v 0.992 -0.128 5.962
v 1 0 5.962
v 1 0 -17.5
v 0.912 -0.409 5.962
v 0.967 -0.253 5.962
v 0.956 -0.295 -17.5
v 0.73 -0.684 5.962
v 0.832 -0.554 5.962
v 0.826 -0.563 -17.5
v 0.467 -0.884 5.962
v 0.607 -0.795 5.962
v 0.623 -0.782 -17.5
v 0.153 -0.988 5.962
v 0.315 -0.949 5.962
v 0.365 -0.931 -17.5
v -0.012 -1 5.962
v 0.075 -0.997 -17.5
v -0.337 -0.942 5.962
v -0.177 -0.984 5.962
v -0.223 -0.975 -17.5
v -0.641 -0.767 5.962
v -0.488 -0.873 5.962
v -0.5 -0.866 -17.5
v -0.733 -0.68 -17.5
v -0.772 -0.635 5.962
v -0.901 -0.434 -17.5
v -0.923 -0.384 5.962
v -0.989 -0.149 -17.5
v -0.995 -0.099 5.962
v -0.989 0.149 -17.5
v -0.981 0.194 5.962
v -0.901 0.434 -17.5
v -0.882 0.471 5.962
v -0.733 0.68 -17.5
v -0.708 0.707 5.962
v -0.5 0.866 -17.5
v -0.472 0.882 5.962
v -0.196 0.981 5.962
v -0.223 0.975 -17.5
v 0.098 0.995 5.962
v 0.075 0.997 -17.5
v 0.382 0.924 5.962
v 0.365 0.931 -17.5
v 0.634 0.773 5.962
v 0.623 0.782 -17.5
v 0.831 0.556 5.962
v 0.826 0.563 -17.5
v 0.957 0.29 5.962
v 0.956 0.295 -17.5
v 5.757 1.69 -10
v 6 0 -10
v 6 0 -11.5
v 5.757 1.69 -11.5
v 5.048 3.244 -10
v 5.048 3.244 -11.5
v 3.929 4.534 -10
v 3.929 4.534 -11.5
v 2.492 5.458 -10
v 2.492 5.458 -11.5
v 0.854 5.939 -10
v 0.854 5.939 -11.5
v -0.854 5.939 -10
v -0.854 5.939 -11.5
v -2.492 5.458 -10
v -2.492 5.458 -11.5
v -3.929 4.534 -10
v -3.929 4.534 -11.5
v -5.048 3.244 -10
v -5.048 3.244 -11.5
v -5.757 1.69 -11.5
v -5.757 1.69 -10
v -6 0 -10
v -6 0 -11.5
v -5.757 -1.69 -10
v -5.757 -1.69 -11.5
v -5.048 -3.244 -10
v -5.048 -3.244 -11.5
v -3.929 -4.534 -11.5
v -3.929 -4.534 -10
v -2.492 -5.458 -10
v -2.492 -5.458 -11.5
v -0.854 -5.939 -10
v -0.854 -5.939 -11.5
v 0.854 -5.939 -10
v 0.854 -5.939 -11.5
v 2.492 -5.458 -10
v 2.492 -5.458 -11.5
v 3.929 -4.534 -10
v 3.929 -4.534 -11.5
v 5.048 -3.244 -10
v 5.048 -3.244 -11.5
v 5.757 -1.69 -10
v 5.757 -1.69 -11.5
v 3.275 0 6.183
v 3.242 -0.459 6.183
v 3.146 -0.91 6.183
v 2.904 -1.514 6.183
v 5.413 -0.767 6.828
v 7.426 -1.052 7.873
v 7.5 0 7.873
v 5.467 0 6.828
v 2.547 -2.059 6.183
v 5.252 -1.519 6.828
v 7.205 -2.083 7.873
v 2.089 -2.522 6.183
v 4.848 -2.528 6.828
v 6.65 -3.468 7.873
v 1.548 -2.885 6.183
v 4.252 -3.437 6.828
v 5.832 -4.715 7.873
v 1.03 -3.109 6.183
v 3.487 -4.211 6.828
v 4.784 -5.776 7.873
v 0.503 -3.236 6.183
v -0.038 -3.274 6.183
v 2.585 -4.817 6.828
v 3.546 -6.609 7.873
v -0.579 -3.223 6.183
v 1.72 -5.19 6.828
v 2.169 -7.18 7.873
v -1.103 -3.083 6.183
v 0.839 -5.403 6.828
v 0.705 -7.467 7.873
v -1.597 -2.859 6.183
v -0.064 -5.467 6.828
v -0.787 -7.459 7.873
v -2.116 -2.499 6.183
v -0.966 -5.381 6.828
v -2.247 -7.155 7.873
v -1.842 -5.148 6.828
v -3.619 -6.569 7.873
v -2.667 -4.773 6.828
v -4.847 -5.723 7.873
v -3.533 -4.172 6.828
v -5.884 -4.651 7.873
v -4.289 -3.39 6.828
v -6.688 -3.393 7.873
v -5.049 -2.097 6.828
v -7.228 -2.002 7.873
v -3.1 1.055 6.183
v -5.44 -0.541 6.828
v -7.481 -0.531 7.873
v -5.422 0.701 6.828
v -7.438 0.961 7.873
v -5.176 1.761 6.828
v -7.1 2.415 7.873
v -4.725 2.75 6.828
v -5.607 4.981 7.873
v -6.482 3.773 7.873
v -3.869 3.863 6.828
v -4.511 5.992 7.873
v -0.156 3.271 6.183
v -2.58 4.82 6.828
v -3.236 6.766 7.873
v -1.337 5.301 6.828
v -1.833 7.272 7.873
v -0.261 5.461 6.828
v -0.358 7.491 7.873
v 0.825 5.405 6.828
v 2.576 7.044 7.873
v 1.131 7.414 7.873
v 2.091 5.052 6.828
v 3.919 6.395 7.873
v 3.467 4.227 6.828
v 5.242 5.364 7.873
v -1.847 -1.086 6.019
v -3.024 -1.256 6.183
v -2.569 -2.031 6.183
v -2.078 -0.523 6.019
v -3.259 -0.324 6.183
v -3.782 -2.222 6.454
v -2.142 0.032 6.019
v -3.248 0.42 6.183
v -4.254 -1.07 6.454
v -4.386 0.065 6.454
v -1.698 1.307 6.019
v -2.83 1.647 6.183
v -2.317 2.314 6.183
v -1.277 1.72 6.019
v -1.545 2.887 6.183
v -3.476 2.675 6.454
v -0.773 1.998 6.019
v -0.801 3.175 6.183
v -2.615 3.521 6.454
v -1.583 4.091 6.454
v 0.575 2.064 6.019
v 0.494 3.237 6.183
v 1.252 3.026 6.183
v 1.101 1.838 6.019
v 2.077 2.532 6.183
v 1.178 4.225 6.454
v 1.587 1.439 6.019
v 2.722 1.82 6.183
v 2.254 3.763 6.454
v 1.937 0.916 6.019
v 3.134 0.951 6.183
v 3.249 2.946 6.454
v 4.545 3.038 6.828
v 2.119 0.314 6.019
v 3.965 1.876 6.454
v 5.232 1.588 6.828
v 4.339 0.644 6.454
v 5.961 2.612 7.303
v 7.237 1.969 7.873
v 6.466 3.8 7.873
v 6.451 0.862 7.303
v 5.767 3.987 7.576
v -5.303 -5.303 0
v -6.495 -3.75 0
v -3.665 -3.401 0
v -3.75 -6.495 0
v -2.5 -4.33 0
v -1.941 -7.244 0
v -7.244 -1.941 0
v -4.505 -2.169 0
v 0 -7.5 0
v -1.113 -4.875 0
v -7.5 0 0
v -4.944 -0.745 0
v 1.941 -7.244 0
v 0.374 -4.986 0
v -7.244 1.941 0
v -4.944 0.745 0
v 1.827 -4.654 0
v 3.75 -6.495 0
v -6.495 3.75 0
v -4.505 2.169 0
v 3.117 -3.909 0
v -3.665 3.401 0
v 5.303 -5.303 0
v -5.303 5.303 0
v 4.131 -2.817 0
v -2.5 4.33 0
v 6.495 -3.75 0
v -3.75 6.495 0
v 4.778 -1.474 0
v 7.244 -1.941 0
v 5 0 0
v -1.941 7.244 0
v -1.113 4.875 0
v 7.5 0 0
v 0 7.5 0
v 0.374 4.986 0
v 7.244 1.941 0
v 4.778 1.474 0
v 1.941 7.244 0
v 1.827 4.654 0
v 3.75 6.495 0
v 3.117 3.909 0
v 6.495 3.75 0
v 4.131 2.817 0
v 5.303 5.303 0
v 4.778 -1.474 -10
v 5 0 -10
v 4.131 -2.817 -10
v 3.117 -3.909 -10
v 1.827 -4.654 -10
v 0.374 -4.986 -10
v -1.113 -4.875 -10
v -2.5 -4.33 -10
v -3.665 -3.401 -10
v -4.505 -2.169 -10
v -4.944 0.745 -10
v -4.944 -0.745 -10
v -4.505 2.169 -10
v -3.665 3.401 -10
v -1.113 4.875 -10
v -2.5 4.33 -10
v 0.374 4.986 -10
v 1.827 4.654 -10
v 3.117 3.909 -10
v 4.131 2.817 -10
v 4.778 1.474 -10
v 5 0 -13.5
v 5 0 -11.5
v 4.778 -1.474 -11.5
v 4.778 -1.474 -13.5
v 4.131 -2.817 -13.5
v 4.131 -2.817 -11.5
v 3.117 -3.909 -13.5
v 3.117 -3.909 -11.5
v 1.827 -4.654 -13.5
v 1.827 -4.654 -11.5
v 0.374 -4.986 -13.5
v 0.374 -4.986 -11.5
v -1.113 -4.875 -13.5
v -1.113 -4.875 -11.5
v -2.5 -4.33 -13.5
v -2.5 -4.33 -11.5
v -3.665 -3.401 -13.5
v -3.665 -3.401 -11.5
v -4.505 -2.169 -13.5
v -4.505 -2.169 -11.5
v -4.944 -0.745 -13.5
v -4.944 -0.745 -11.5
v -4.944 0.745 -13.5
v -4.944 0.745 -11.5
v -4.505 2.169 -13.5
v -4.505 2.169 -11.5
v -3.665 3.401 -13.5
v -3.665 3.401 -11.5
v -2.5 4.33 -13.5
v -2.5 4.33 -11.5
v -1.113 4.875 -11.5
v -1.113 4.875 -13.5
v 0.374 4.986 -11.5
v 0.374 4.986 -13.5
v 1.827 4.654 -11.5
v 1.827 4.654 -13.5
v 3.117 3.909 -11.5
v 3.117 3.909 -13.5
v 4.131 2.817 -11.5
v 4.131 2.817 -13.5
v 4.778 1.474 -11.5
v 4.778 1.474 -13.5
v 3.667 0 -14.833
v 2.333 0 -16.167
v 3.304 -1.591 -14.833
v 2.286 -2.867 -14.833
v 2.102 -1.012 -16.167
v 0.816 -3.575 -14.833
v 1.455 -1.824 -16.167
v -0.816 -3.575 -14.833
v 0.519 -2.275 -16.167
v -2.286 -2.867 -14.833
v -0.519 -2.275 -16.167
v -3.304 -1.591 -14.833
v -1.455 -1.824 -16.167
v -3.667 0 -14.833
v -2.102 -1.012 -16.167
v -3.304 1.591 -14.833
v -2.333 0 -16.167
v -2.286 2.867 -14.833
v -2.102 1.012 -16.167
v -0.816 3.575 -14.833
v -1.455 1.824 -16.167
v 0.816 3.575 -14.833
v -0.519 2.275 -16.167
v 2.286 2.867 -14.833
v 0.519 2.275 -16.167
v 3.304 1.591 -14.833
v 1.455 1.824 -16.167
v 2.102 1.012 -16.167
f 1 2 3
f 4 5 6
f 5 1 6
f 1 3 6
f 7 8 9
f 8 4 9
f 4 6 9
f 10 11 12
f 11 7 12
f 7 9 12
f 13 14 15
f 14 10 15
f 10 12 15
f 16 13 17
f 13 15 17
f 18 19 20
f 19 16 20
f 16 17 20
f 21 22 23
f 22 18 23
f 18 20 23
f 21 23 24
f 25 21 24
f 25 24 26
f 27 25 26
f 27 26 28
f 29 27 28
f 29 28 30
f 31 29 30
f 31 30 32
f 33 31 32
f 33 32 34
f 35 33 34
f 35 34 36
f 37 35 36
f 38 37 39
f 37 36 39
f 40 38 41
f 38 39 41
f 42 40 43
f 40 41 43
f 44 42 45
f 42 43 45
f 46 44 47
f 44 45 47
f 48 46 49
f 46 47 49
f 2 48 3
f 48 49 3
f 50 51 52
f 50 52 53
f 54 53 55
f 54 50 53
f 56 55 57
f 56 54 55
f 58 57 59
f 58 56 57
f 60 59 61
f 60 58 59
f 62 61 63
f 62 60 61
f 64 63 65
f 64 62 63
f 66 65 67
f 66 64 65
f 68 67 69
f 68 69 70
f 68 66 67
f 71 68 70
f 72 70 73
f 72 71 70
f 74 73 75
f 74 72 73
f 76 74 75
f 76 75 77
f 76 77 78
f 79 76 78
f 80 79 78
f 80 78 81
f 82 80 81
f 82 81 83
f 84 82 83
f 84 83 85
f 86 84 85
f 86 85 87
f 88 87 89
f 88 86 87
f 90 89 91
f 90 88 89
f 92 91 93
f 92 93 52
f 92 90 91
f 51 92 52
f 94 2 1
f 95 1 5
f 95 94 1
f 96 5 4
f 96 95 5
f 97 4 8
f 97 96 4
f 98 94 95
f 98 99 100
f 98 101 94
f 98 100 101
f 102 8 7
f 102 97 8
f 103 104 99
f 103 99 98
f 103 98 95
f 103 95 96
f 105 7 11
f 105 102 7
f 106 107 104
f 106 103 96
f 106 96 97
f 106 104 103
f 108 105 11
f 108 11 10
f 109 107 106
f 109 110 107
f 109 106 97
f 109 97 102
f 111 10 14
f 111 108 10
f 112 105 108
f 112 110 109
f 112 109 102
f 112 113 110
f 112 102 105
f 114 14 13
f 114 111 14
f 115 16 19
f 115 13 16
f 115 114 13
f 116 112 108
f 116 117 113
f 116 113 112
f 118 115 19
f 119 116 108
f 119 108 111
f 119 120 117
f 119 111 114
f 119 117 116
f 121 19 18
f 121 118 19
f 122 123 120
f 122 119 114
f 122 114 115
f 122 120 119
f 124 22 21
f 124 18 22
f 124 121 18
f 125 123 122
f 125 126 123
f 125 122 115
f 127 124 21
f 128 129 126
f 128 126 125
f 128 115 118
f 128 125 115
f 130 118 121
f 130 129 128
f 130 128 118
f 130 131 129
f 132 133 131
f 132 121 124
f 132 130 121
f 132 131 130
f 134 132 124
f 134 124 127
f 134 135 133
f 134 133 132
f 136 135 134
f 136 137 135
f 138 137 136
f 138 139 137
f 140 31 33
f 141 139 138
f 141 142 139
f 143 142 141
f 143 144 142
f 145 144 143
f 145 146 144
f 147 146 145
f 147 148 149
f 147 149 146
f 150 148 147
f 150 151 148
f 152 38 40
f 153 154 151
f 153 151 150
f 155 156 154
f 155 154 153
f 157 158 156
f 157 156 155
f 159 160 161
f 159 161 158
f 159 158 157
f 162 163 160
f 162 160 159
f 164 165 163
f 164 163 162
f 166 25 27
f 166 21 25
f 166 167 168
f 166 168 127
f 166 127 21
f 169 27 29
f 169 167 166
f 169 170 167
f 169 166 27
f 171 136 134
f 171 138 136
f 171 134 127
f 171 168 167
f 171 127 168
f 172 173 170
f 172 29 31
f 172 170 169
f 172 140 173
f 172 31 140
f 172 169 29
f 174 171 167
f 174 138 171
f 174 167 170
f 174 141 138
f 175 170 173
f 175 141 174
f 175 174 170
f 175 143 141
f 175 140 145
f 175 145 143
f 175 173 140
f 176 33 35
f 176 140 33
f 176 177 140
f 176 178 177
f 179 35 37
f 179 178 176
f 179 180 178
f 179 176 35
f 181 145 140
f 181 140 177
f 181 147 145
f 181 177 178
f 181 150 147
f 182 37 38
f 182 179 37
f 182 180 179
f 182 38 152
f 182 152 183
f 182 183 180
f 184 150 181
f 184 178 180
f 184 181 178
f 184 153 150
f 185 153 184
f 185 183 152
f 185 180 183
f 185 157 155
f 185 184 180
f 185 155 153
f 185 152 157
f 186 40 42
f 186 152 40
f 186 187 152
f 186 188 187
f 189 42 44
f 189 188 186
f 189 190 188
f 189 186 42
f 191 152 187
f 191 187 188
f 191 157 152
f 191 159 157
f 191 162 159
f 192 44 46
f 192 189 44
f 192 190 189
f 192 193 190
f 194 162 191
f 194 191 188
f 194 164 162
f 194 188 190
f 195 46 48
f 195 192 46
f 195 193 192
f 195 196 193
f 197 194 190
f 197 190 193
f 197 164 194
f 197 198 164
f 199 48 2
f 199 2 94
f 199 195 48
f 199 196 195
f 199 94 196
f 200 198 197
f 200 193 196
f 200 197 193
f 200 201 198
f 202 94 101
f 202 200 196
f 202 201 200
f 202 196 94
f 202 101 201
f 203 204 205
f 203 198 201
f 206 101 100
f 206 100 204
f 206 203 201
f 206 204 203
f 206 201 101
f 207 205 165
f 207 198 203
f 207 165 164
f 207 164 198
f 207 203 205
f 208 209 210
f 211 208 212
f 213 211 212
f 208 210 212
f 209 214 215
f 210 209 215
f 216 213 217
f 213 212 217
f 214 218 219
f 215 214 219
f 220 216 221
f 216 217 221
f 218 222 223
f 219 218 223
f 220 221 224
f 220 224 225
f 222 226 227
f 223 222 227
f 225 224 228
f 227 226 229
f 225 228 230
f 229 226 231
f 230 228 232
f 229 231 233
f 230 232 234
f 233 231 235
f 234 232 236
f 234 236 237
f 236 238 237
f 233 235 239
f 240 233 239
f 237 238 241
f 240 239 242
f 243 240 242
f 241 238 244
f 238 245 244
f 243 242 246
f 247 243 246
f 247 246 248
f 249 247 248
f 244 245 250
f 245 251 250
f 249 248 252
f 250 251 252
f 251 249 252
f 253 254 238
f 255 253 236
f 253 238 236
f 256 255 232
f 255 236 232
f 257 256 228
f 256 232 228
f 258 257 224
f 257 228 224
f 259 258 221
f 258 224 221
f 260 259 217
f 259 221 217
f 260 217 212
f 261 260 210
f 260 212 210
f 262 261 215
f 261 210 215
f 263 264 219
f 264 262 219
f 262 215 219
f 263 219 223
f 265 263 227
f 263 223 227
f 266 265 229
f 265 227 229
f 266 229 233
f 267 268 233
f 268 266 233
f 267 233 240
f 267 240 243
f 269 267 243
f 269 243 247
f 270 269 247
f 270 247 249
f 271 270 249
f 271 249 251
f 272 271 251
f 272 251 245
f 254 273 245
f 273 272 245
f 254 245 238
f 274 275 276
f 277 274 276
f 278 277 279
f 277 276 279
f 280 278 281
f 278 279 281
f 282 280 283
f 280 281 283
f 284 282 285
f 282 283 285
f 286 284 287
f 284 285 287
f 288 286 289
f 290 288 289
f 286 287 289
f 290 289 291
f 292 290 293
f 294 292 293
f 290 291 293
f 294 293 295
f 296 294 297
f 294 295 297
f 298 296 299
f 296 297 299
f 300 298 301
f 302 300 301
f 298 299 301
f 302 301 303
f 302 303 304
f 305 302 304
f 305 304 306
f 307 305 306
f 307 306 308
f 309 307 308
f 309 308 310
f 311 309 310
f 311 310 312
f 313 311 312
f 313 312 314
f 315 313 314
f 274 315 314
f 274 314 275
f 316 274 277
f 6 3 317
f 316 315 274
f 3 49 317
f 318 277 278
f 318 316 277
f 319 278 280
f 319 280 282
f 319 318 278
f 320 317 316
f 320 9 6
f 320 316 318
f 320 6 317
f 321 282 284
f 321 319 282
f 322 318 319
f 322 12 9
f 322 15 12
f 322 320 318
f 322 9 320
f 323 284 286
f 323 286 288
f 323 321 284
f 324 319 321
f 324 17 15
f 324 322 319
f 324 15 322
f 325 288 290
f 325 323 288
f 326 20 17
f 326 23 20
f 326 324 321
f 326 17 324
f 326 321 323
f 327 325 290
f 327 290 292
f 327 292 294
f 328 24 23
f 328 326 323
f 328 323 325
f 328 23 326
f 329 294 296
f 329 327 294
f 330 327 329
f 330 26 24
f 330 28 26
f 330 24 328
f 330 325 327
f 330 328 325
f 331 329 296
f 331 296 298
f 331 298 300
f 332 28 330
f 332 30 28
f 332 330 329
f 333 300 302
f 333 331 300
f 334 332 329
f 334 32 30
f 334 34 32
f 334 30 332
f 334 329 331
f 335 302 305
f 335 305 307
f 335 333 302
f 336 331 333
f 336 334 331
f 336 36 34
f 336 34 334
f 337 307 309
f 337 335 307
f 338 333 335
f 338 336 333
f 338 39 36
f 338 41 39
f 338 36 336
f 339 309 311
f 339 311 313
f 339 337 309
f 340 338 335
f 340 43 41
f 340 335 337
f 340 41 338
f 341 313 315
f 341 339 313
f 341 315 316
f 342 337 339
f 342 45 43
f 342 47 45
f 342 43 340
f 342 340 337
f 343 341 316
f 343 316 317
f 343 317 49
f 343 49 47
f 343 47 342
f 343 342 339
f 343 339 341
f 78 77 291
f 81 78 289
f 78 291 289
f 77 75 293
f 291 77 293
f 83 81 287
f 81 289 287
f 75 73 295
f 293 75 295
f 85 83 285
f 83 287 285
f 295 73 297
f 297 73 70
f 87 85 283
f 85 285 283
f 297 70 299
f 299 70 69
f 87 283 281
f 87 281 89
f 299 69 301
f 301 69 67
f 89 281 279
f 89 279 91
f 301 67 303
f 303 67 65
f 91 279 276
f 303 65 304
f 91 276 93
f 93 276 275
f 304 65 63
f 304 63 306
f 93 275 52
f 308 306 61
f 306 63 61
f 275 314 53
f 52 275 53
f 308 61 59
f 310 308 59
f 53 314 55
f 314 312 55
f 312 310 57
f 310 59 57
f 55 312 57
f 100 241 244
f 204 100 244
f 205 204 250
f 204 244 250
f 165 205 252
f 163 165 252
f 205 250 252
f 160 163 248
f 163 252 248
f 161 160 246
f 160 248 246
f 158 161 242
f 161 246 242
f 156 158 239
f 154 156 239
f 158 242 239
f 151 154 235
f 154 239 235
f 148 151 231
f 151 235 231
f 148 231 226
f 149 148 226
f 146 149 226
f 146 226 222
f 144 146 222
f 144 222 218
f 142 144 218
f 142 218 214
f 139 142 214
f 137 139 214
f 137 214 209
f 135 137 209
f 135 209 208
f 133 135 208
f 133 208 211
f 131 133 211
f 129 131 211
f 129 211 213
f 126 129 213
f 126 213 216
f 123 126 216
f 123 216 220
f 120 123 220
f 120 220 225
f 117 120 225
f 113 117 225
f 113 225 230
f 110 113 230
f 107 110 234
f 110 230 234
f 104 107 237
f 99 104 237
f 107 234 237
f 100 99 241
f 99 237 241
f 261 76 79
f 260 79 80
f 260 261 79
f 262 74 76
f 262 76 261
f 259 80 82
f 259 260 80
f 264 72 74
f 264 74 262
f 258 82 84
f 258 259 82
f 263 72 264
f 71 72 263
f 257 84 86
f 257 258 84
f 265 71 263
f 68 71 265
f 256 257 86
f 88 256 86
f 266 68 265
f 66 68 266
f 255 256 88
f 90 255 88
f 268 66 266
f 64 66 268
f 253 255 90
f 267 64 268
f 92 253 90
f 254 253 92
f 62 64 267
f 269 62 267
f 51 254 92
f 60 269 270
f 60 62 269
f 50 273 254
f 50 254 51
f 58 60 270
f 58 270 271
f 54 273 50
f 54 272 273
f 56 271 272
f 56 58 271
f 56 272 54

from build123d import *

# Parameters (mm, degrees)
F0_R      = 7.5
F1_DEPTH  = 10
F4_R      = 5
F5_DEPTH  = 18
F6_R      = 1
F7_DEPTH  = 25.8740546369
F10_R     = 6
F10_R_2   = 5
F11_DEPTH = 1.5


# Not quite as in the source:
# - a fillet or chamfer that OpenCascade refuses, or shapes differently, is made with other operations: its cross-section is extruded or revolved along the edge and cut away or added


with BuildPart() as f1:
    # F0 (on Top) → F1 (new body)
    with BuildSketch(Plane.XY):
        Circle(F0_R)
    extrude(amount=F1_DEPTH)

    # F2 (on Front) → F3 (revolve, cut)
    with BuildSketch(Plane.XZ):
        with BuildLine():
            Line((10, 10), (0, 10))
            Line((0, 10), (0, 6))
            ThreePointArc((0, 6), (5.4685094621, 6.8287263446), (10, 10))
        make_face()
    revolve(axis=Axis((0, 0, 8), (0, 0, -1)), mode=Mode.SUBTRACT)

    # F4 (on face) → F5 (join)
    with BuildSketch(Plane(origin=(0, 0, 0), x_dir=(1, 0, 0), z_dir=(0, 0, -1))):
        Circle(F4_R)
    extrude(amount=F5_DEPTH)

    # F6 (on face) → F7 (cut, through all)
    with BuildSketch(Plane(origin=(0, 0, -18), x_dir=(1, 0, 0), z_dir=(0, 0, -1))):
        Circle(F6_R)
    extrude(amount=-F7_DEPTH, mode=Mode.SUBTRACT)

    # F8: chamfer of 4.5 on 1 edges, made by hand

    # F8_s1 → F8_t2 (revolve, cut)
    with BuildSketch(Plane.XZ):
        Polygon((5, -13.5), (0.5, -18), (5, -18), align=None)
    revolve(axis=Axis((0, 0, -18), (0, 0, -1)), mode=Mode.SUBTRACT)

    # F10 (on offset) → F11 (join)
    with BuildSketch(Plane.XY.offset(-10)):
        Circle(F10_R)
        Circle(F10_R_2, mode=Mode.SUBTRACT)
    extrude(amount=-F11_DEPTH)


solid = f1.part
